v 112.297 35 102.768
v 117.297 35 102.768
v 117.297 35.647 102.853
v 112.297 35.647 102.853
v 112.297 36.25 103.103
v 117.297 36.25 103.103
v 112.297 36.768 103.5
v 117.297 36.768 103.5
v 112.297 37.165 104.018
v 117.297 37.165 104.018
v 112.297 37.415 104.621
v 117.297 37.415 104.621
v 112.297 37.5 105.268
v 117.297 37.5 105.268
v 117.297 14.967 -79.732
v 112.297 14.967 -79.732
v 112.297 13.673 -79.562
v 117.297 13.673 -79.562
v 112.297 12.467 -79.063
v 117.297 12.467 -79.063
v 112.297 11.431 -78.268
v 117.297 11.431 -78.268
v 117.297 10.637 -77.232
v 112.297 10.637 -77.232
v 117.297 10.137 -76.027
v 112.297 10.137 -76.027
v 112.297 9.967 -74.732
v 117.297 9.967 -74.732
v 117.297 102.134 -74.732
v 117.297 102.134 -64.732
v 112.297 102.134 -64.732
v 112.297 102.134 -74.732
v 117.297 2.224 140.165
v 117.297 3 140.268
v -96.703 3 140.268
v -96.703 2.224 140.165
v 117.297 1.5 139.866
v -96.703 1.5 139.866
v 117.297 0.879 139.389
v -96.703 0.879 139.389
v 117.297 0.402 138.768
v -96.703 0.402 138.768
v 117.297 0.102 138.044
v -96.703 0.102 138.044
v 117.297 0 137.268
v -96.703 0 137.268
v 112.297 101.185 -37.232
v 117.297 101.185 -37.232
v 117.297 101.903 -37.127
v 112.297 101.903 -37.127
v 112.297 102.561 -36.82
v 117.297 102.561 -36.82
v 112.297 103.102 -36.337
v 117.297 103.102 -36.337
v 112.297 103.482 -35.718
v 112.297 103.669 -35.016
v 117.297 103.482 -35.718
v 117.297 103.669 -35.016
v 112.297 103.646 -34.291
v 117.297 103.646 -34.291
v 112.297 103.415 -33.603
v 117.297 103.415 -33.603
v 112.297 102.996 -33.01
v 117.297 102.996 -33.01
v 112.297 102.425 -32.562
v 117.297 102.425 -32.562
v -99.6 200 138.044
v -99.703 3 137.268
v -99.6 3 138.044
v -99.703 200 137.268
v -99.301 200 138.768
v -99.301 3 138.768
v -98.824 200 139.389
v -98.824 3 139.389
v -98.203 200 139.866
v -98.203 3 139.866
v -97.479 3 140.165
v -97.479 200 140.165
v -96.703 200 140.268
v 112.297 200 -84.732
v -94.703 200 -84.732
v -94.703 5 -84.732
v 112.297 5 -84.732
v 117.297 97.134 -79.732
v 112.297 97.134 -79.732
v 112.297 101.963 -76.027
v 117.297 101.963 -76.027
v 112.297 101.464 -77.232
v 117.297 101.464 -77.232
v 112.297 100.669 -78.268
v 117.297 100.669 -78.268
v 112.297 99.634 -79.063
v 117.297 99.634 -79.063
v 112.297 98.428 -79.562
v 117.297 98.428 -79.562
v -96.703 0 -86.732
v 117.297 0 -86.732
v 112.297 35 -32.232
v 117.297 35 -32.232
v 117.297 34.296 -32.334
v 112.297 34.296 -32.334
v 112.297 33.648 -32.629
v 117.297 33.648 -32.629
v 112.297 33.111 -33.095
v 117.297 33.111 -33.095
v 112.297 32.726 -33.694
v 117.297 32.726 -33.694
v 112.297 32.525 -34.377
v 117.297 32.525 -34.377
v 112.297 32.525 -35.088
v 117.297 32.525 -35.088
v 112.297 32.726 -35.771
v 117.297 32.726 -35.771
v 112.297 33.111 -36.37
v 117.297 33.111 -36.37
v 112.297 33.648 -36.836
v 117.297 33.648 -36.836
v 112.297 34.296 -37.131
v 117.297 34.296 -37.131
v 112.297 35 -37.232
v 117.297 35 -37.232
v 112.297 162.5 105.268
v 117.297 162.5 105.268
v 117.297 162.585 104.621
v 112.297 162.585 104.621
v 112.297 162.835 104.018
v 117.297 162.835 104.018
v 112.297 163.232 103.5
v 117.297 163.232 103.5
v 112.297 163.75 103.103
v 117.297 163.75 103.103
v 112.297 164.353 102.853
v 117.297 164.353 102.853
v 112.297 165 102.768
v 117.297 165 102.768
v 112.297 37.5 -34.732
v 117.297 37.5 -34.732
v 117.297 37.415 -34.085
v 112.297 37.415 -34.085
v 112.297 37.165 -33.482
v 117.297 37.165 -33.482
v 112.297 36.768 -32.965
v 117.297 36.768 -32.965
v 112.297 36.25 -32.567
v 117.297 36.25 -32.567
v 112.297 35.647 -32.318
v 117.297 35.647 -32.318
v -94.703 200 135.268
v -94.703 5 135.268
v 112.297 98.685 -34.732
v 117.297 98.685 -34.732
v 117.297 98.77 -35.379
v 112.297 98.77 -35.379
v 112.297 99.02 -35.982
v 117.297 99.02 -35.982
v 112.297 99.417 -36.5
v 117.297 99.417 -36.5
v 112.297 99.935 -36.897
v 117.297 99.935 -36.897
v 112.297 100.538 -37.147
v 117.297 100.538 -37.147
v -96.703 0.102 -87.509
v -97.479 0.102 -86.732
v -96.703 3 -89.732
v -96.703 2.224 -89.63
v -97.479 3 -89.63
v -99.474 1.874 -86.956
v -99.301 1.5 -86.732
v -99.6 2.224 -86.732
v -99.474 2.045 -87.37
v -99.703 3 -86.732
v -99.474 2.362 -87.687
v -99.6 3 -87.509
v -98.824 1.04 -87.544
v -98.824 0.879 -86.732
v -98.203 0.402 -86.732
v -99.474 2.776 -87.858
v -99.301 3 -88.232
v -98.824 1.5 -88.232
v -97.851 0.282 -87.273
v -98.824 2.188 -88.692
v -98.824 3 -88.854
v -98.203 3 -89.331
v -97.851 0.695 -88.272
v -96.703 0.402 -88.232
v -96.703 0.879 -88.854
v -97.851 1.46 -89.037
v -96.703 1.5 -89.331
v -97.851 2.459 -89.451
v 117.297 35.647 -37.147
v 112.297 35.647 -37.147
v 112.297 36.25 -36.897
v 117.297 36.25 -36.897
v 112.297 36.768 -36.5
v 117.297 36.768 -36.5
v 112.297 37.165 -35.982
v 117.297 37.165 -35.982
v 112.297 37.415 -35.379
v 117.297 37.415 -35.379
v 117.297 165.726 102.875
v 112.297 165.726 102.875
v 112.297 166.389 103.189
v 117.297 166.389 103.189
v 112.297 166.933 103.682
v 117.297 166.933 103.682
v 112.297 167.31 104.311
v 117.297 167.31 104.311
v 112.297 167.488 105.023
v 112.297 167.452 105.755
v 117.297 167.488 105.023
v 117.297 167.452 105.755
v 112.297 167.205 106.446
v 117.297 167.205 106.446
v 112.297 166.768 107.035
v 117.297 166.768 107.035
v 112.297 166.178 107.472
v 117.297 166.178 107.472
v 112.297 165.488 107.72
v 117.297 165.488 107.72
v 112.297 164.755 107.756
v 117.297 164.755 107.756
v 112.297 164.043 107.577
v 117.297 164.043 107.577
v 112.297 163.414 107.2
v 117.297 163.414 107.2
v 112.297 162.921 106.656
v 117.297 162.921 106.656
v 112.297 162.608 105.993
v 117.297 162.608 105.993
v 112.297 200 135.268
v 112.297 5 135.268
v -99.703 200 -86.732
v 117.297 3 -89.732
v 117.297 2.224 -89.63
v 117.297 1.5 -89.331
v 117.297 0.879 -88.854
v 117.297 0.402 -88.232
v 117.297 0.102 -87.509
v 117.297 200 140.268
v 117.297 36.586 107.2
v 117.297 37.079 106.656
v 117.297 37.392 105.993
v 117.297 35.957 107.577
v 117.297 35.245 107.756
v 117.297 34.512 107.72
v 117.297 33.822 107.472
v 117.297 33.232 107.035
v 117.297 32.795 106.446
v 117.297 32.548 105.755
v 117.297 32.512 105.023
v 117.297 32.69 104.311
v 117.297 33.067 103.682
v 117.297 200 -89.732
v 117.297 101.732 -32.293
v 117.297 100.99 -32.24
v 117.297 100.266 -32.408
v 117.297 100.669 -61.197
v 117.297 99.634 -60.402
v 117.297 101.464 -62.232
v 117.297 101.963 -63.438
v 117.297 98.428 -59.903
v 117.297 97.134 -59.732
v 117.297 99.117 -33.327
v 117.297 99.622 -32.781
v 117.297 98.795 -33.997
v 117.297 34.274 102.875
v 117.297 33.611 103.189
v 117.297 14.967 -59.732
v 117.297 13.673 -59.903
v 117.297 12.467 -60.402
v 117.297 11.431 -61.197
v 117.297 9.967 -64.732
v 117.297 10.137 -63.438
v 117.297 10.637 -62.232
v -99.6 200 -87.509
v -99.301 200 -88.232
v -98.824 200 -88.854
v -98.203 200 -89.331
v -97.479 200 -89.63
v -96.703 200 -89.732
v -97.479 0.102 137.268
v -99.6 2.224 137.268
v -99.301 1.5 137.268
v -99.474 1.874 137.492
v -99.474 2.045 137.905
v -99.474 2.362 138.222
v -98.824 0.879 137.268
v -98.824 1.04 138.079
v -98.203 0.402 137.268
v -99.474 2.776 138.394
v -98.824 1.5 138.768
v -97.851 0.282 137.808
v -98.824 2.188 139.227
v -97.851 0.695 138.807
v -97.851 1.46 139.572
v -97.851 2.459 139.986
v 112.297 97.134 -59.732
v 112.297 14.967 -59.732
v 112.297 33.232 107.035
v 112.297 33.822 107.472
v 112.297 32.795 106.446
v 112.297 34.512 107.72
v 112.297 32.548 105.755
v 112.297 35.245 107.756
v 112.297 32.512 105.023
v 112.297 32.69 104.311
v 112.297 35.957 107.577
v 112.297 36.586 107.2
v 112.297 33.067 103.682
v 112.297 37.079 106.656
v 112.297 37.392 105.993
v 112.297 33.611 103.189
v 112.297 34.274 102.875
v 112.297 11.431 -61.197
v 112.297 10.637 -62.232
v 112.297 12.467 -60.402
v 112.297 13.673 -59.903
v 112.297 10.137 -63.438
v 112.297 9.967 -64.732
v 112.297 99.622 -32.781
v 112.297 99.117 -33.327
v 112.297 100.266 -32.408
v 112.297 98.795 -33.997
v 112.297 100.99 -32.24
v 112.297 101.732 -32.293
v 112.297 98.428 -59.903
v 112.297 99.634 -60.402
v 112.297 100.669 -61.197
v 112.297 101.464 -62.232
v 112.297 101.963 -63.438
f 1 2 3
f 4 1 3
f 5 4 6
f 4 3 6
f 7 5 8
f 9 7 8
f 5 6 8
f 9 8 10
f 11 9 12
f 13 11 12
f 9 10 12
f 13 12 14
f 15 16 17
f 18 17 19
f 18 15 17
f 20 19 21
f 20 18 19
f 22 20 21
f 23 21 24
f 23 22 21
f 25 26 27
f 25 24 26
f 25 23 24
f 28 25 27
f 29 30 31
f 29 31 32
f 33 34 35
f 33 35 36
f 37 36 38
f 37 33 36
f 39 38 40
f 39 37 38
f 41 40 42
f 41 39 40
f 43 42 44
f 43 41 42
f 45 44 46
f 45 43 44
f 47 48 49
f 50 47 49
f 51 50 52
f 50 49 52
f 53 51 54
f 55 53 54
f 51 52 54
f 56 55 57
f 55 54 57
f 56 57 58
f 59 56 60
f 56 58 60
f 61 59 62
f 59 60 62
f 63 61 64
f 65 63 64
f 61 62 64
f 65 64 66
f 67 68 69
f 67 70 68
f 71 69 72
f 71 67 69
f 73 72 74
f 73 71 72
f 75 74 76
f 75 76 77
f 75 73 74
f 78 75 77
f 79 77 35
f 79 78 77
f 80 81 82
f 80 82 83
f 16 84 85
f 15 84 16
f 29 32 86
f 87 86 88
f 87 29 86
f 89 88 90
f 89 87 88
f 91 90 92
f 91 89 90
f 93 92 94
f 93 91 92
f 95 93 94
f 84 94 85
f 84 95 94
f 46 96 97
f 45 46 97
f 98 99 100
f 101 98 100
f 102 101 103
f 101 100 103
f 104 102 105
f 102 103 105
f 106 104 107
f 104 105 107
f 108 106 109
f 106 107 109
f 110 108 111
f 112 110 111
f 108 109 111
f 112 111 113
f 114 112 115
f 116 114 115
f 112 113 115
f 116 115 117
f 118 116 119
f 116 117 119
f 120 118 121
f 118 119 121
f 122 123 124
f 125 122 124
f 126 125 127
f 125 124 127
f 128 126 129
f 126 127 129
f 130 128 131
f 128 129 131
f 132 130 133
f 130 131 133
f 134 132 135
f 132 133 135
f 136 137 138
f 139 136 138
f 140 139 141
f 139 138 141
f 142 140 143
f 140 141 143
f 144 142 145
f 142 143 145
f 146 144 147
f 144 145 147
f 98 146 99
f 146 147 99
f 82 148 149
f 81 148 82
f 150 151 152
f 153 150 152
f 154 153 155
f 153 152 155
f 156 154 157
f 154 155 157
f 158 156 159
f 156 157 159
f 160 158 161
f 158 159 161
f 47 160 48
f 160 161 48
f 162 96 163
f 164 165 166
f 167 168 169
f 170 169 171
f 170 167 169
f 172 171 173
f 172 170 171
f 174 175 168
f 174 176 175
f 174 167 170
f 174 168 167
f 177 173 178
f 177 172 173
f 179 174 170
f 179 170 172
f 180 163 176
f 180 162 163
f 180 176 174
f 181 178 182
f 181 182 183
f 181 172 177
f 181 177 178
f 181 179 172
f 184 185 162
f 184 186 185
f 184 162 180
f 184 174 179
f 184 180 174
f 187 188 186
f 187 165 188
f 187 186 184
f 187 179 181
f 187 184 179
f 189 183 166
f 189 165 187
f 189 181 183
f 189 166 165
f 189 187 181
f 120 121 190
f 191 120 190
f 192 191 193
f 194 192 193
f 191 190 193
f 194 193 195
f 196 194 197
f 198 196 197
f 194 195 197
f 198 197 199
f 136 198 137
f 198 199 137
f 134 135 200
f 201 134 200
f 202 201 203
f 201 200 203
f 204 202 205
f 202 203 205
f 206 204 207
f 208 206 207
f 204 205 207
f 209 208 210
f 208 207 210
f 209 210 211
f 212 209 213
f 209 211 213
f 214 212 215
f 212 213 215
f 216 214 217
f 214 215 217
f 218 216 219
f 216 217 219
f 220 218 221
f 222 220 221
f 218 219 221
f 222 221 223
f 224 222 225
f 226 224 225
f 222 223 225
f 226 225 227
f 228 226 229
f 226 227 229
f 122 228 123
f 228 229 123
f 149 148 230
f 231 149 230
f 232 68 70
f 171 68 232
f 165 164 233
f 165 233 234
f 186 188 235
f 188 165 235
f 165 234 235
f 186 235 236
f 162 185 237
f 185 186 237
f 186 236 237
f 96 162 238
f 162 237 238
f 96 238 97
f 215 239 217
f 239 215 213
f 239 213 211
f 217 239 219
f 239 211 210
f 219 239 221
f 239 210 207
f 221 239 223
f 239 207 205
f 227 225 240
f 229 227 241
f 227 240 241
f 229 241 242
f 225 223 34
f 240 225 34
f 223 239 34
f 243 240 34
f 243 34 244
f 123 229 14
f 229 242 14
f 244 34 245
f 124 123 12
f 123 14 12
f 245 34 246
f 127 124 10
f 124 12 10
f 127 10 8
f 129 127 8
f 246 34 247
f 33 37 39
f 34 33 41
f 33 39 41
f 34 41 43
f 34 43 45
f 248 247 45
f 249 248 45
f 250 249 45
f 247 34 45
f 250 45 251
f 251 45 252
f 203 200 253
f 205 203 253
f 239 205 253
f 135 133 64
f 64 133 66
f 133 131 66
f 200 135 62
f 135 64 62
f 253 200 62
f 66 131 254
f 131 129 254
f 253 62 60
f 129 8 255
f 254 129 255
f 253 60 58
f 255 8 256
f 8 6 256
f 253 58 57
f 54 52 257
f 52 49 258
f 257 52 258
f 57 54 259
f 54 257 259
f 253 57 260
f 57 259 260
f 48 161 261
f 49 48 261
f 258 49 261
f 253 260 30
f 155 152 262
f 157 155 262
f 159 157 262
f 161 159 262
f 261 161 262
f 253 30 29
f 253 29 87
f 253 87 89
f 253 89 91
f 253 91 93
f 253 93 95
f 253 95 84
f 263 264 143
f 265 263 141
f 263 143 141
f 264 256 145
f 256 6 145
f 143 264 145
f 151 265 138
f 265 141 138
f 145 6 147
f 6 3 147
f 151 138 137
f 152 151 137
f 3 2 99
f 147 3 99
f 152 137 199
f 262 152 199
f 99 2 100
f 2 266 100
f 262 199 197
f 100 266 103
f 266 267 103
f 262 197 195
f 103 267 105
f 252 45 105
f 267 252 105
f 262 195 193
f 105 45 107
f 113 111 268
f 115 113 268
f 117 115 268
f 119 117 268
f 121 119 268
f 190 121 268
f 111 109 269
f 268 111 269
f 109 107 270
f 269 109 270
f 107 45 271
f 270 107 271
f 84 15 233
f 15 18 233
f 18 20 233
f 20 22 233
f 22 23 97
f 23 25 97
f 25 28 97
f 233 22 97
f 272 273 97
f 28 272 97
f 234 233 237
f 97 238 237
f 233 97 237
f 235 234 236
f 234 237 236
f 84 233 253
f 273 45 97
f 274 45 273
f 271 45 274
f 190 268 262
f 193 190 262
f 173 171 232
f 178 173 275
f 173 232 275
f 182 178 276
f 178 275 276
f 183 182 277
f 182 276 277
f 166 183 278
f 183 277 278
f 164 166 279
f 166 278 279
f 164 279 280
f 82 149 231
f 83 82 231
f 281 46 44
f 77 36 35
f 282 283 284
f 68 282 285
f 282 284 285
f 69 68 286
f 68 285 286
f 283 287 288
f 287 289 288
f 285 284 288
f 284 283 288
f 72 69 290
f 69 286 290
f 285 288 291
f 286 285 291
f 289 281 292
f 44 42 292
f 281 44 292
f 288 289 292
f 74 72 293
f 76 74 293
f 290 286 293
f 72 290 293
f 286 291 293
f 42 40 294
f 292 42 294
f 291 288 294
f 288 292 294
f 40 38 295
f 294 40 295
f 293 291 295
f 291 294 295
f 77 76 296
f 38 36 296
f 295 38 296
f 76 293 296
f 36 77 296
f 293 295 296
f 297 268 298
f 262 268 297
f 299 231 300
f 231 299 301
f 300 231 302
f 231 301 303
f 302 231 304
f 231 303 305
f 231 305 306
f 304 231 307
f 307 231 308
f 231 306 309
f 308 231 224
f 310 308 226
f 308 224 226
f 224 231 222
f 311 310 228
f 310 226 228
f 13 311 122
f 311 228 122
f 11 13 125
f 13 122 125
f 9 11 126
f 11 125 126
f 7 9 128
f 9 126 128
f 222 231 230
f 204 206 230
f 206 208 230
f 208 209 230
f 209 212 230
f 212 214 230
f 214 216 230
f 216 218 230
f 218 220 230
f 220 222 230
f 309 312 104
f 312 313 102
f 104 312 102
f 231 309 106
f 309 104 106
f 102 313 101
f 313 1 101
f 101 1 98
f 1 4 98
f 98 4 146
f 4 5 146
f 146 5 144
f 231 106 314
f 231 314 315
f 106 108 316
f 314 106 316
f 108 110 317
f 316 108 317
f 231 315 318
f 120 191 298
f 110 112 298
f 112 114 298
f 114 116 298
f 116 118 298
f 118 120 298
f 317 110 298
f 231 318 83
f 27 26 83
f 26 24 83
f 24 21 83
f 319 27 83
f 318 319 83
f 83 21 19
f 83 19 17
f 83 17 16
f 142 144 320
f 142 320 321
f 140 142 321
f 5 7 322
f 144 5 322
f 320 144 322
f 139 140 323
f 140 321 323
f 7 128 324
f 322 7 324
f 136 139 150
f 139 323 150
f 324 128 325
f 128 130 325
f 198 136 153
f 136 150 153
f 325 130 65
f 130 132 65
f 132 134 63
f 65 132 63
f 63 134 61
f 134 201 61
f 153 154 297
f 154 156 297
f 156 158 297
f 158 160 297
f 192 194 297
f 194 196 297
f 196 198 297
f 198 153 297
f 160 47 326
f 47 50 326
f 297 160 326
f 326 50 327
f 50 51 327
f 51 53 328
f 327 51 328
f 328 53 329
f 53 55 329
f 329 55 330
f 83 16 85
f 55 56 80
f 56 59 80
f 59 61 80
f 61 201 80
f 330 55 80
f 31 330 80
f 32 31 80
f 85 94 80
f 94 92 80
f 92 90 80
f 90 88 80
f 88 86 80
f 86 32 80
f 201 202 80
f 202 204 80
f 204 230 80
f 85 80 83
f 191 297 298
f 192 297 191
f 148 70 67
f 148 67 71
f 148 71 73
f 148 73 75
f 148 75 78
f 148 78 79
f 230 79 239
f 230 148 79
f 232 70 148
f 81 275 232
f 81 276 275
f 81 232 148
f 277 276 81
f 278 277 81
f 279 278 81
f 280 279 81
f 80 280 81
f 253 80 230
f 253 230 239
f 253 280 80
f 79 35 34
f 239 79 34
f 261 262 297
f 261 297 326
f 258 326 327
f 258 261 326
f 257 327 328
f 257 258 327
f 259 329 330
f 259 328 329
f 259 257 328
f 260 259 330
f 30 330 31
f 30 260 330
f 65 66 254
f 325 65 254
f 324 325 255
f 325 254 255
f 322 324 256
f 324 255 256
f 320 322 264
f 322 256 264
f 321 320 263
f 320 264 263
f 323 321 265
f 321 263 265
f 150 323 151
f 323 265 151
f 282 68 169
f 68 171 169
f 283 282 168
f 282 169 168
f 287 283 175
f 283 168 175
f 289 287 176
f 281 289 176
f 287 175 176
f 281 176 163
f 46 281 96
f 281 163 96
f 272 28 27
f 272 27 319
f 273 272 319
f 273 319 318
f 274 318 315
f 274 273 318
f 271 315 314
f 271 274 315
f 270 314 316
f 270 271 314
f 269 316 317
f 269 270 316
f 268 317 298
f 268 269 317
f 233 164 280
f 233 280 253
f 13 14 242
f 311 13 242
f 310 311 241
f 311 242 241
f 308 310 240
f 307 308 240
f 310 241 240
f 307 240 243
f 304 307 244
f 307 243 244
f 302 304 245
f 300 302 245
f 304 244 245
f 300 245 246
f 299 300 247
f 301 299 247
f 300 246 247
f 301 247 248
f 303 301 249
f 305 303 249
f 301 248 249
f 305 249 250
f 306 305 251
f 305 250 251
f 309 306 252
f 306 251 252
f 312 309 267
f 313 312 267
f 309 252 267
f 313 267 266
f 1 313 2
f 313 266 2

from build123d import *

# Parameters (mm, degrees)
SKETCH1_W           = 217
SKETCH1_H           = 230
BOSS_EXTRUDE1_DEPTH = 200
SKETCH2_W           = 207
SKETCH2_H           = 220
CUT_EXTRUDE1_DEPTH  = 195
FILLET1_R           = 3
CUT_EXTRUDE2_DEPTH  = 5
CUT_EXTRUDE3_DEPTH  = 10


with BuildPart() as part:
    # Sketch1 → Boss-Extrude1 (new body)
    with BuildSketch(Plane(origin=(0, 0, 0), x_dir=(1, 0, 0), z_dir=(0, 1, 0))):
        with Locations((8.797297297, -25.267567568)):
            Rectangle(SKETCH1_W, SKETCH1_H)
    extrude(amount=BOSS_EXTRUDE1_DEPTH)

    # Sketch2 → Cut-Extrude1 (cut)
    with BuildSketch(Plane(origin=(0, 200, 0), x_dir=(1, 0, 0), z_dir=(0, 1, 0))):
        with Locations((8.797297297, -25.267567568)):
            Rectangle(SKETCH2_W, SKETCH2_H)
    extrude(amount=-CUT_EXTRUDE1_DEPTH, mode=Mode.SUBTRACT)

    # Fillet1
    fillet1_edges = [part.edges().sort_by_distance(p)[0] for p in [
        (8.797297297, 0, -89.732432432),
        (8.797297297, 0, 140.267567568),
        (-99.702702703, 0, 25.267567568),
        (-99.702702703, 100, -89.732432432),
        (-99.702702703, 100, 140.267567568),
    ]]
    fillet(fillet1_edges, radius=FILLET1_R)

    # Sketch3 → Cut-Extrude2 (cut)
    with BuildSketch(Plane(origin=(117.297297297, 0, 0), x_dir=(0, 0, -1), z_dir=(1, 0, 0))):
        with BuildLine():
            ThreePointArc((-105.267567568, 162.5), (-103.499800615, 163.232233047), (-102.767567568, 165))
            Line((-102.767567568, 165), (-105.267567568, 165))
            Line((-105.267567568, 165), (-105.267567568, 162.5))
        make_face()
        with BuildLine():
            Line((-105.267567568, 165), (-102.767567568, 165))
            ThreePointArc((-102.767567568, 165), (-107.035334521, 166.767766953), (-105.267567568, 162.5))
            Line((-105.267567568, 162.5), (-105.267567568, 165))
        make_face()
        with BuildLine():
            ThreePointArc((-105.267567568, 37.5), (-107.035334521, 33.232233047), (-102.767567568, 35))
            Line((-102.767567568, 35), (-105.267567568, 35))
            Line((-105.267567568, 35), (-105.267567568, 37.5))
        make_face()
        with BuildLine():
            Line((-105.267567568, 35), (-102.767567568, 35))
            ThreePointArc((-102.767567568, 35), (-103.499800615, 36.767766953), (-105.267567568, 37.5))
            Line((-105.267567568, 37.5), (-105.267567568, 35))
        make_face()
        with BuildLine():
            ThreePointArc((37.232432432, 35), (36.500199385, 36.767766953), (34.732432432, 37.5))
            Line((34.732432432, 37.5), (34.732432432, 35))
            Line((34.732432432, 35), (32.232432432, 35))
            ThreePointArc((32.232432432, 35), (34.732432432, 32.5), (37.232432432, 35))
        make_face()
        with BuildLine():
            Line((34.732432432, 35), (34.732432432, 37.5))
            ThreePointArc((34.732432432, 37.5), (32.964665479, 36.767766953), (32.232432432, 35))
            Line((32.232432432, 35), (34.732432432, 35))
        make_face()
        with BuildLine():
            Line((32.56180467, 102.425143832), (34.732432432, 101.184831324))
            Line((34.732432432, 101.184831324), (34.732432432, 98.684831324))
            ThreePointArc((34.732432432, 98.684831324), (36.500199385, 99.417064371), (37.232432432, 101.184831324))
            ThreePointArc((37.232432432, 101.184831324), (35.37408288, 103.601085595), (32.56180467, 102.425143832))
        make_face()
        with BuildLine():
            Line((34.732432432, 98.684831324), (34.732432432, 101.184831324))
            Line((34.732432432, 101.184831324), (32.56180467, 102.425143832))
            ThreePointArc((32.56180467, 102.425143832), (32.570167269, 99.929996927), (34.732432432, 98.684831324))
        make_face()
    extrude(amount=-CUT_EXTRUDE2_DEPTH, mode=Mode.SUBTRACT)

    # Sketch4 → Cut-Extrude3 (cut)
    with BuildSketch(Plane(origin=(117.297297297, 0, 0), x_dir=(0, 0, -1), z_dir=(1, 0, 0))):
        with BuildLine():
            Line((64.732432432, 102.133518404), (74.732432432, 102.133518404))
            ThreePointArc((74.732432432, 102.133518404), (78.267966338, 100.66905231), (79.732432432, 97.133518404))
            Line((79.732432432, 97.133518404), (79.732432432, 14.966834817))
            ThreePointArc((79.732432432, 14.966834817), (78.267966338, 11.431300911), (74.732432432, 9.966834817))
            Line((74.732432432, 9.966834817), (64.732432432, 9.966834817))
            ThreePointArc((64.732432432, 9.966834817), (61.196898526, 11.431300911), (59.732432432, 14.966834817))
            Line((59.732432432, 14.966834817), (59.732432432, 97.133518404))
            ThreePointArc((59.732432432, 97.133518404), (61.196898526, 100.66905231), (64.732432432, 102.133518404))
        make_face()
    extrude(amount=-CUT_EXTRUDE3_DEPTH, mode=Mode.SUBTRACT)


solid = part.part
